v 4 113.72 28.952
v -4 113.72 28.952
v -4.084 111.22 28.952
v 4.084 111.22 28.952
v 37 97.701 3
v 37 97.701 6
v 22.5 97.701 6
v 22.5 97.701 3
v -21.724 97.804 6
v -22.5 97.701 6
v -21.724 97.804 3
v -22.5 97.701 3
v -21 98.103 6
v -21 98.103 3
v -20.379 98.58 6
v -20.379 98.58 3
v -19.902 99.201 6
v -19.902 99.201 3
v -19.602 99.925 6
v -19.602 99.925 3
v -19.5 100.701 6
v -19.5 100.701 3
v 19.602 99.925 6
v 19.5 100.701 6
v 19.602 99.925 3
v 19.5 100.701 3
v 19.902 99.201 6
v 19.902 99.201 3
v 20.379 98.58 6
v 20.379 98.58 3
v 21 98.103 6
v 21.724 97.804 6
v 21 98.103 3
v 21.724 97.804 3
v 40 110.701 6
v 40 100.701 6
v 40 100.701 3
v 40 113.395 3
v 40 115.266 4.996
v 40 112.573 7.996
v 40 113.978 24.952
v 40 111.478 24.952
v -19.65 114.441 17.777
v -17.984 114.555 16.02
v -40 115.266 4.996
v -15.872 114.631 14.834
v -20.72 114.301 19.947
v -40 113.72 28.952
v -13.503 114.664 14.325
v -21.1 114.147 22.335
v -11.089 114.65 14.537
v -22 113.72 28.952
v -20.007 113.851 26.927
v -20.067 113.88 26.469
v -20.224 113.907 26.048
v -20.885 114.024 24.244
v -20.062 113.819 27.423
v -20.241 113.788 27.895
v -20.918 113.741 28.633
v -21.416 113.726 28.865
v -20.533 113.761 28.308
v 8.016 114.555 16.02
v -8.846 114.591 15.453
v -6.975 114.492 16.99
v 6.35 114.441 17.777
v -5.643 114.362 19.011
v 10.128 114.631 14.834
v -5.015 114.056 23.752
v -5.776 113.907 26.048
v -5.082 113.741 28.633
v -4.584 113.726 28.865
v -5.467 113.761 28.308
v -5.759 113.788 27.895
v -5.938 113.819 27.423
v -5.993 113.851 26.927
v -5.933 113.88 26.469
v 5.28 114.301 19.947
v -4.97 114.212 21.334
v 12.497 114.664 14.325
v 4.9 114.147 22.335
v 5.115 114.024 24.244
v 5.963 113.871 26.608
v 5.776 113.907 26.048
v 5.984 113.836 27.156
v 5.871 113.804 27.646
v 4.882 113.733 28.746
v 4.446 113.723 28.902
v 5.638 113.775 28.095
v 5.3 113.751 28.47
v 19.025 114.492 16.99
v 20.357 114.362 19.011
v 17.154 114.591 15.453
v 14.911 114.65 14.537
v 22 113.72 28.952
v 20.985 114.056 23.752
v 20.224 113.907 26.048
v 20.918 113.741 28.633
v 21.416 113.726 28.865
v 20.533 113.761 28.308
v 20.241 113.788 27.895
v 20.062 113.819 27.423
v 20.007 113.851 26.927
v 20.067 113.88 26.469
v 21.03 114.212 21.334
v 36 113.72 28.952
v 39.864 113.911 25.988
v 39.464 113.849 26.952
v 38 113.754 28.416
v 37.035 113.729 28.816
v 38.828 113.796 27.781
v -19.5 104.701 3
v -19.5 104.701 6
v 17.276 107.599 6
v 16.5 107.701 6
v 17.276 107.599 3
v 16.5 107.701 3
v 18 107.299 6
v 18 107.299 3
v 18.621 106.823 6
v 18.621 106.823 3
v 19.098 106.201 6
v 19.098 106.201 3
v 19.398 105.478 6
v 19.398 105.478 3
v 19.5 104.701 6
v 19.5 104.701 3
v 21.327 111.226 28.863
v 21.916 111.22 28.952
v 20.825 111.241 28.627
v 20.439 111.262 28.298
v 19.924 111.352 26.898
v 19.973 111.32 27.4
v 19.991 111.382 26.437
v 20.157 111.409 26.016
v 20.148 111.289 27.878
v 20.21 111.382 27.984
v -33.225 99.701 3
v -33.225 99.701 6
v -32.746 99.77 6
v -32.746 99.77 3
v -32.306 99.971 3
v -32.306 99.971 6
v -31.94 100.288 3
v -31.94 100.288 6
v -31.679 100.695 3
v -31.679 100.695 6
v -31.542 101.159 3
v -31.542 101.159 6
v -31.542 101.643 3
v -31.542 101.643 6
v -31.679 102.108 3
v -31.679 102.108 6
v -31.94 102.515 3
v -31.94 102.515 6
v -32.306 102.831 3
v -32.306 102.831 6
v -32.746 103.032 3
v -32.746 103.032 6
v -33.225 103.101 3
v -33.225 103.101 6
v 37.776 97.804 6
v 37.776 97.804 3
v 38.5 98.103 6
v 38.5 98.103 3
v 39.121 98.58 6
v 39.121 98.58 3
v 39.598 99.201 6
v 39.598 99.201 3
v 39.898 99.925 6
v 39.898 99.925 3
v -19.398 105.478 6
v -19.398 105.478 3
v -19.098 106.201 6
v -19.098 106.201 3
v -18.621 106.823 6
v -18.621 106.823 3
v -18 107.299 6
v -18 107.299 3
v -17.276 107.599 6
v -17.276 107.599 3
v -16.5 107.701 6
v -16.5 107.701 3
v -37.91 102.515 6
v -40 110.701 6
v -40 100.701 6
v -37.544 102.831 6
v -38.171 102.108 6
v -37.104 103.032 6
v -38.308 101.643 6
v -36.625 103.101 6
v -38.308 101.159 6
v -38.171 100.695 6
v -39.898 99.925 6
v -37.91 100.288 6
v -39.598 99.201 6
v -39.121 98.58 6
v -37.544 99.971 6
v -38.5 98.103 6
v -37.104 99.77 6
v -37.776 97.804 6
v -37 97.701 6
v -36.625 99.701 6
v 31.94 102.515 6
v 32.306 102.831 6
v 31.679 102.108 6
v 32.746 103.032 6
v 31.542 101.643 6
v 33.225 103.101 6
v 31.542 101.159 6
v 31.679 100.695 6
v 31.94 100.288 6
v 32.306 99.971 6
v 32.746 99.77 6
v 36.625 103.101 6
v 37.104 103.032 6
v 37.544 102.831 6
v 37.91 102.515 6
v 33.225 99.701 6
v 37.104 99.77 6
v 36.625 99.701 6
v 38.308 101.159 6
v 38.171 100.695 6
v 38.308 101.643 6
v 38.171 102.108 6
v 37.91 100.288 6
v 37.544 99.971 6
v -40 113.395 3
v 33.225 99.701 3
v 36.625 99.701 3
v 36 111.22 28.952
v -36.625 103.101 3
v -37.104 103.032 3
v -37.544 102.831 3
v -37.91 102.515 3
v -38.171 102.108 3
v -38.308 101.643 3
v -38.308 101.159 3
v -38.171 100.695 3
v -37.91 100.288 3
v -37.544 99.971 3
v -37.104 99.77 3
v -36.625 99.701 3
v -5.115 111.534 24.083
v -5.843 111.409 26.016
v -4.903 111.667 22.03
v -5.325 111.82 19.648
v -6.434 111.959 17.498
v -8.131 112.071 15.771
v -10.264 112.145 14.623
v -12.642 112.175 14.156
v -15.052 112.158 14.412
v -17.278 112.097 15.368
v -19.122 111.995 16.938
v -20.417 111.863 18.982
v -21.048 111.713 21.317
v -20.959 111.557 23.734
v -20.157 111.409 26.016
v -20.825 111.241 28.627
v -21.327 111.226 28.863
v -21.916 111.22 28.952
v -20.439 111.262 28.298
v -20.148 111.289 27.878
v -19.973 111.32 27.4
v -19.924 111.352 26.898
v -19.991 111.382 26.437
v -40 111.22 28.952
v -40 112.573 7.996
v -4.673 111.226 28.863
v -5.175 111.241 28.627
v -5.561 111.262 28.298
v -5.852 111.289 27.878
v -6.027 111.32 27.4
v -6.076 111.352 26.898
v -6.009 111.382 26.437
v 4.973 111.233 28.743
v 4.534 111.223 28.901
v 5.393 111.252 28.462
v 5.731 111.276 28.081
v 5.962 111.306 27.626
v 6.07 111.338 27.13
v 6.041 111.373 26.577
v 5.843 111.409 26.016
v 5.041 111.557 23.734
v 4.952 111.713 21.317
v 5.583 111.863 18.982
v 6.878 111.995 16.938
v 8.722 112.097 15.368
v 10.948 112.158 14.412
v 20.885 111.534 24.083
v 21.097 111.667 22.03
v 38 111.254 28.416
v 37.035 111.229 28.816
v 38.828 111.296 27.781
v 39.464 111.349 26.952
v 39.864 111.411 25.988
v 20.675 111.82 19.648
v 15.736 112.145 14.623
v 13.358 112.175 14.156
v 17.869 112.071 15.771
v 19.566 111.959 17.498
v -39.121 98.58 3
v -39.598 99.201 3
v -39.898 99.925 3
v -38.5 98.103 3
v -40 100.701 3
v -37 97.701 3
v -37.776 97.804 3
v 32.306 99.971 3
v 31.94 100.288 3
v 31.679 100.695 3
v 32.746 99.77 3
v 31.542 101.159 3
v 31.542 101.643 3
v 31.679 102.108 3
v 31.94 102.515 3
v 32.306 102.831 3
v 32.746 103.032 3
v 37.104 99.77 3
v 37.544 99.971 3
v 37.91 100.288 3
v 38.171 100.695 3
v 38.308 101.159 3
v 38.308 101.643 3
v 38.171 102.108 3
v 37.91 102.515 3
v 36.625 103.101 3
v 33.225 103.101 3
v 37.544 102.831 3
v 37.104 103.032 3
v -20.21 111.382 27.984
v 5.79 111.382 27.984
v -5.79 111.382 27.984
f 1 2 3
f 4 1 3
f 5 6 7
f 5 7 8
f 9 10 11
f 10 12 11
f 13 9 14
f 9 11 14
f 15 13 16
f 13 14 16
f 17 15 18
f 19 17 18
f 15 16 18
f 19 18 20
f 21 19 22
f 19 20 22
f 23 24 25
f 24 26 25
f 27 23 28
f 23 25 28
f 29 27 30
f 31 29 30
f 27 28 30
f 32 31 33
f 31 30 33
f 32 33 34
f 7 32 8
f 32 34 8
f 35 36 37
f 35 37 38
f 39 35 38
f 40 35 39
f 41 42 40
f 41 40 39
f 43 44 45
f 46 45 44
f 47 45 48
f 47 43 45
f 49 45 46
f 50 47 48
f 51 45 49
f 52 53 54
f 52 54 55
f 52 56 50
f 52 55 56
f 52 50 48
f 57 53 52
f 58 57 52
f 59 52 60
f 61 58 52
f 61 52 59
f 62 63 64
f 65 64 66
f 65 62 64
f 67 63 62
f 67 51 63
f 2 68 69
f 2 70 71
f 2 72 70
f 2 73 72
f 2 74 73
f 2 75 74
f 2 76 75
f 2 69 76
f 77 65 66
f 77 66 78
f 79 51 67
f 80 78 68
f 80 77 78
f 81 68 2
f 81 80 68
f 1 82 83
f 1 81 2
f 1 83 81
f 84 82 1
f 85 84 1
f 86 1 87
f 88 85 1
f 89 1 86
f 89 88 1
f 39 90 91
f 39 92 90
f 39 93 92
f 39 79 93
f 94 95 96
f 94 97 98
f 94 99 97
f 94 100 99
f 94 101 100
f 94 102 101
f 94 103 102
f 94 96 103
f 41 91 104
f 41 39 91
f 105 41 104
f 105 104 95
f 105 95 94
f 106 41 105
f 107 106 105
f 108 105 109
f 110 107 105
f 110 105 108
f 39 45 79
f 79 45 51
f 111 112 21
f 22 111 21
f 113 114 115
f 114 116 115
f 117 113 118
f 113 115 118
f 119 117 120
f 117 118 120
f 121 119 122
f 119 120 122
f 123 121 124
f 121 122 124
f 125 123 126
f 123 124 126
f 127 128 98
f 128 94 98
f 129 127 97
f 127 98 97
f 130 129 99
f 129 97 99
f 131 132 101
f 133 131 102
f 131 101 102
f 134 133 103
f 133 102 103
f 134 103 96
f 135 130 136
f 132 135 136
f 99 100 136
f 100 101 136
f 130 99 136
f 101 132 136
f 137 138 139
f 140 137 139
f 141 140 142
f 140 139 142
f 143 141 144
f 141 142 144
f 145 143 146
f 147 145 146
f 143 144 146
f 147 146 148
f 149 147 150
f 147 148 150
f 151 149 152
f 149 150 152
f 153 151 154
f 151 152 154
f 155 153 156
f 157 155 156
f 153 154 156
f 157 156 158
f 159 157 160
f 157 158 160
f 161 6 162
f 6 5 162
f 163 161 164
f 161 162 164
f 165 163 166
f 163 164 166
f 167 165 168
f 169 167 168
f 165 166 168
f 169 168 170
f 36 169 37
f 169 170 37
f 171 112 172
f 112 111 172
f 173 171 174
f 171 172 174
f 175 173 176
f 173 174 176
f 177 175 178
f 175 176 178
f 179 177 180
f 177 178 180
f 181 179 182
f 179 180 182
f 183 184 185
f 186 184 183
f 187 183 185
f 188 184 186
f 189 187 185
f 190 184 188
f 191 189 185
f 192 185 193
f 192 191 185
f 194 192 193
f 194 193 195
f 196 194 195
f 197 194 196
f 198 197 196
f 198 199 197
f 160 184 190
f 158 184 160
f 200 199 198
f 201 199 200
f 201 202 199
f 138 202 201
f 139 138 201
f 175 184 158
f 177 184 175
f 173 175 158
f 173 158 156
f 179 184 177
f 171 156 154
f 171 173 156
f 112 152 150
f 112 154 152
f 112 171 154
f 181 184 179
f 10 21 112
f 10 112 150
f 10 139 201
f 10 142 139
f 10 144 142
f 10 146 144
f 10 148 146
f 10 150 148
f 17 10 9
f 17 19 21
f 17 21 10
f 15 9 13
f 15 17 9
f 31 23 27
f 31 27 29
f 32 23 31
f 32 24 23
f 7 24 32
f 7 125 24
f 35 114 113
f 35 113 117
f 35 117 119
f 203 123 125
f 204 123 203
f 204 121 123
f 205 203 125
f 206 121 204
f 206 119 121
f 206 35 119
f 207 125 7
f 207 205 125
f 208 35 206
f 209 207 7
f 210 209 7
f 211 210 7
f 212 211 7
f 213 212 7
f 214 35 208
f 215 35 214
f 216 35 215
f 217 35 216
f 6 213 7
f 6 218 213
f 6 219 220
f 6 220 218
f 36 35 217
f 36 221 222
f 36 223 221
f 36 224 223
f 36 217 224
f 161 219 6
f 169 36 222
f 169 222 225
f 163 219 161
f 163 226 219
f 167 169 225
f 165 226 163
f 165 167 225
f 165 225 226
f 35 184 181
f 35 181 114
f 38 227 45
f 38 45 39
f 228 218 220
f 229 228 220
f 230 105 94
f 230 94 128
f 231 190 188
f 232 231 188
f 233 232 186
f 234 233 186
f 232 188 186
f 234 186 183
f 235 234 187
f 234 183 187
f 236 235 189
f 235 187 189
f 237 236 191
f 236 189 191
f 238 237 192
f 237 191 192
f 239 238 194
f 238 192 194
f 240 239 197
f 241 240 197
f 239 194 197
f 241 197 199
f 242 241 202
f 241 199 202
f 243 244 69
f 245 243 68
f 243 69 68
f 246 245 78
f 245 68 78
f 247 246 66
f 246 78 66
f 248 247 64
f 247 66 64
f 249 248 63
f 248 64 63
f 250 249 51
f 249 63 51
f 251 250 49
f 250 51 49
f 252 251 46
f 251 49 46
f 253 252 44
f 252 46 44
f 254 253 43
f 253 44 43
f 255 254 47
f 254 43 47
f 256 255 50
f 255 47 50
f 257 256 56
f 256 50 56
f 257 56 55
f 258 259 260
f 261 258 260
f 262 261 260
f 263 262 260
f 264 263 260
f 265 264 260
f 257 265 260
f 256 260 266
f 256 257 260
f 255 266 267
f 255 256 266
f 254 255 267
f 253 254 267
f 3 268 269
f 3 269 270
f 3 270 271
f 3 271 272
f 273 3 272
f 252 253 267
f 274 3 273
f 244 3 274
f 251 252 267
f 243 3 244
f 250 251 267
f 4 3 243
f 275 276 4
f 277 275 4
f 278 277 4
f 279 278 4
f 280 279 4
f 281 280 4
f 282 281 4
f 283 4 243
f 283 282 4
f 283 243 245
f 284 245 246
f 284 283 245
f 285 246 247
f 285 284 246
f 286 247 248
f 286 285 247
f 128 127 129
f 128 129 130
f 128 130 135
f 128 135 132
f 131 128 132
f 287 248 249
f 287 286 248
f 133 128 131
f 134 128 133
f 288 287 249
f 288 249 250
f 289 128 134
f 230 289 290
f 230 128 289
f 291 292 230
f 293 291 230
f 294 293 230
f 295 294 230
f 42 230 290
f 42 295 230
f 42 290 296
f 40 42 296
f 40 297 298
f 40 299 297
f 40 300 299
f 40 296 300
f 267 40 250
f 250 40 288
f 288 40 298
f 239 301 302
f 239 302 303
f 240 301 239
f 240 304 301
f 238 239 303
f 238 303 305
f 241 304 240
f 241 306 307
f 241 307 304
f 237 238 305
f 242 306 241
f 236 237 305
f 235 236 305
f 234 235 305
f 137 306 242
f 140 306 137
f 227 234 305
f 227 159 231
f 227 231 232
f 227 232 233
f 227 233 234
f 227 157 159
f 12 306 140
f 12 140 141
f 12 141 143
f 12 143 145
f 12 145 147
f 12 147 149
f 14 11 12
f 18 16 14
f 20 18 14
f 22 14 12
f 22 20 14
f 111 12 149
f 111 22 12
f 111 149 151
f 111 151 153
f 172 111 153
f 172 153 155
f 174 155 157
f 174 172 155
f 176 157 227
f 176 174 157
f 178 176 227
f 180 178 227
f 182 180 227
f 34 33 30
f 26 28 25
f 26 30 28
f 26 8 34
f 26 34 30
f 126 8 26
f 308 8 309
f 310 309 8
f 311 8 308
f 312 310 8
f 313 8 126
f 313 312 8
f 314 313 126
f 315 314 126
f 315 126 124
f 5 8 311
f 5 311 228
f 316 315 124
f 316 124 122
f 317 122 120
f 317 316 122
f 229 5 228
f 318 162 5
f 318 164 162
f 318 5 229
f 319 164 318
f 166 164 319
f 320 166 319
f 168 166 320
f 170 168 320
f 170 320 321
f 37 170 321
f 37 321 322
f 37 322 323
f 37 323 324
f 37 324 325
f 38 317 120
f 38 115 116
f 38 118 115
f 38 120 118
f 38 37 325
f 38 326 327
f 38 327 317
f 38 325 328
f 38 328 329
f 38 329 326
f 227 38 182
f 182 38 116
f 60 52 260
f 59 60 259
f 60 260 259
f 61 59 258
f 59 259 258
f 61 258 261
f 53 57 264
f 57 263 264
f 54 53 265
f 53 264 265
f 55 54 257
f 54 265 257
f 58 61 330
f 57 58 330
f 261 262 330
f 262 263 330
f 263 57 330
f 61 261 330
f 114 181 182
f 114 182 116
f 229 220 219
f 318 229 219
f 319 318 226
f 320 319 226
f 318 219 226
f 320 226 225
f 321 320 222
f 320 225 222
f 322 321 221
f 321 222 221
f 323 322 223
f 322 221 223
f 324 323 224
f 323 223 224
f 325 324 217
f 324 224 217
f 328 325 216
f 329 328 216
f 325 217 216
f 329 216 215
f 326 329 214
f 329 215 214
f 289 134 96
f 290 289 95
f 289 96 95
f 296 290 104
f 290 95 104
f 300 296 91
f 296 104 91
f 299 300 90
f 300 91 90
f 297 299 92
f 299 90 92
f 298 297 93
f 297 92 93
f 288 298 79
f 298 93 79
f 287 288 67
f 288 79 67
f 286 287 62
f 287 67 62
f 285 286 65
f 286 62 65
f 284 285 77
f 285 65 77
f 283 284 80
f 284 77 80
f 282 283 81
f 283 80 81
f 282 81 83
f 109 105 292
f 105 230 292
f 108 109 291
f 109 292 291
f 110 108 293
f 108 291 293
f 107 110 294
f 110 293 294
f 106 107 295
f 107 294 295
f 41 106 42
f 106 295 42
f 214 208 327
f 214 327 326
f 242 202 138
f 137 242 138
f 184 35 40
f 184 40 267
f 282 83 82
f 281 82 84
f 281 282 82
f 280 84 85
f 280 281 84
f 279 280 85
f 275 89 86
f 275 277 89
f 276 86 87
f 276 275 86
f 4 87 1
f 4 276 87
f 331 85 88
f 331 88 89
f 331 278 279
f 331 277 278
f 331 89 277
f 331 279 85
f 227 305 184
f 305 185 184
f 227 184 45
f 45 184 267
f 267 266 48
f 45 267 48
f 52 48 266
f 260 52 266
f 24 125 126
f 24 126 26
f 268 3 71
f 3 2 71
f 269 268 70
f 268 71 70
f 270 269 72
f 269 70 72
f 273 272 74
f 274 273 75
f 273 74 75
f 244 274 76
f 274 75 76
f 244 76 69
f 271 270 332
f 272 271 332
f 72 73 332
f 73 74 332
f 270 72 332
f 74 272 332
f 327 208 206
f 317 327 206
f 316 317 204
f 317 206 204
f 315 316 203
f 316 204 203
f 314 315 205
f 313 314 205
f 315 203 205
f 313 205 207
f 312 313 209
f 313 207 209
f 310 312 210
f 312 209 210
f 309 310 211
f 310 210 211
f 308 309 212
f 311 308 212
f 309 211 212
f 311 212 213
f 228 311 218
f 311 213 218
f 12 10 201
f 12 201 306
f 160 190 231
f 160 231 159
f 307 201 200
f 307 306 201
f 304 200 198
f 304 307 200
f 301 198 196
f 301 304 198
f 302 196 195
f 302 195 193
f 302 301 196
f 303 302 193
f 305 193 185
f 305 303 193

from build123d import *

# Parameters (mm, degrees)
PAD006_DEPTH    = 40
SKETCH009_W     = 14
SKETCH009_H     = 39
POCKET002_DEPTH = 5
SKETCH010_R     = 8.1
POCKET003_DEPTH = 5
FILLET001_R     = 3
FILLET002_R     = 2
FILLET003_R     = 4
CHAMFER_SIZE    = 2
CHAMFER001_SIZE = 2


with BuildPart() as part:
    # Sketch008 → Pad006 (new body, symmetric)
    with BuildSketch(Plane.YZ):
        Polygon((97.701339, 0), (115.394972, 0), (113.719903, 25.952241), (111.219903, 25.952241), (112.701339, 3), (97.701339, 3), align=None)
    extrude(amount=PAD006_DEPTH, both=True)

    # Sketch009 (on Face5 of Pad006) → Pocket002 (cut)
    with BuildSketch(Plane(origin=(0, 0, 3), x_dir=(0, -1, 0), z_dir=(0, 0, 1))):
        with Locations((-100.701339, 0)):
            Rectangle(SKETCH009_W, SKETCH009_H)
        with BuildLine():
            ThreePointArc((-103.101339, -36.625), (-101.401339, -38.325), (-99.701339, -36.625))
            Line((-99.701339, -36.625), (-99.701339, -33.225))
            ThreePointArc((-99.701339, -33.225), (-101.401339, -31.525), (-103.101339, -33.225))
            Line((-103.101339, -36.625), (-103.101339, -33.225))
        make_face()
        with BuildLine():
            ThreePointArc((-103.101339, 33.225), (-101.401339, 31.525), (-99.701339, 33.225))
            Line((-99.701339, 33.225), (-99.701339, 36.625))
            ThreePointArc((-99.701339, 36.625), (-101.401339, 38.325), (-103.101339, 36.625))
            Line((-103.101339, 33.225), (-103.101339, 36.625))
        make_face()
    extrude(amount=-POCKET002_DEPTH, mode=Mode.SUBTRACT)

    # Sketch010 (on Face3 of Pocket002) → Pocket003 (cut)
    with BuildSketch(Plane(origin=(0, 114.916235, 7.417187), x_dir=(0, -0.06441, 0.997924), z_dir=(0, 0.997924, 0.06441))):
        with Locations((12, -13)):
            Circle(SKETCH010_R)
        with Locations((12, 13)):
            Circle(SKETCH010_R)
    extrude(amount=-POCKET003_DEPTH, mode=Mode.SUBTRACT)

    # Fillet001
    fillet001_edges = [part.edges().sort_by_distance(p)[0] for p in [
        (-19.5, 97.701339, 1.5),
        (-40, 97.701339, 1.5),
        (19.5, 107.701339, 1.5),
        (19.5, 97.701339, 1.5),
        (40, 97.701339, 1.5),
        (-19.5, 107.701339, 1.5),
    ]]
    fillet(fillet001_edges, radius=FILLET001_R)

    # Fillet002
    fillet002_edges = [part.edges().sort_by_distance(p)[0] for p in [
        (-17.618693, 112.469704, 25.952241),
        (-8.381307, 112.469704, 25.952241),
        (8.381307, 112.469704, 25.952241),
        (17.618693, 112.469704, 25.952241),
    ]]
    fillet(fillet002_edges, radius=FILLET002_R)

    # Fillet003
    fillet003_edges = [part.edges().sort_by_distance(p)[0] for p in [
        (40, 112.469903, 25.952241),
    ]]
    fillet(fillet003_edges, radius=FILLET003_R)

    # Chamfer
    chamfer_edges = [part.edges().sort_by_distance(p)[0] for p in [
        (0, 112.701339, 3),
    ]]
    chamfer(chamfer_edges, length=CHAMFER_SIZE)

    # Chamfer001
    chamfer001_edges = [part.edges().sort_by_distance(p)[0] for p in [
        (0, 115.394972, 0),
    ]]
    chamfer(chamfer001_edges, length=CHAMFER001_SIZE)


with BuildPart() as part_1:
    # Body005 placement: moved
    add(part.part.moved(Location((0, 0, 3))))


solid = part_1.part
